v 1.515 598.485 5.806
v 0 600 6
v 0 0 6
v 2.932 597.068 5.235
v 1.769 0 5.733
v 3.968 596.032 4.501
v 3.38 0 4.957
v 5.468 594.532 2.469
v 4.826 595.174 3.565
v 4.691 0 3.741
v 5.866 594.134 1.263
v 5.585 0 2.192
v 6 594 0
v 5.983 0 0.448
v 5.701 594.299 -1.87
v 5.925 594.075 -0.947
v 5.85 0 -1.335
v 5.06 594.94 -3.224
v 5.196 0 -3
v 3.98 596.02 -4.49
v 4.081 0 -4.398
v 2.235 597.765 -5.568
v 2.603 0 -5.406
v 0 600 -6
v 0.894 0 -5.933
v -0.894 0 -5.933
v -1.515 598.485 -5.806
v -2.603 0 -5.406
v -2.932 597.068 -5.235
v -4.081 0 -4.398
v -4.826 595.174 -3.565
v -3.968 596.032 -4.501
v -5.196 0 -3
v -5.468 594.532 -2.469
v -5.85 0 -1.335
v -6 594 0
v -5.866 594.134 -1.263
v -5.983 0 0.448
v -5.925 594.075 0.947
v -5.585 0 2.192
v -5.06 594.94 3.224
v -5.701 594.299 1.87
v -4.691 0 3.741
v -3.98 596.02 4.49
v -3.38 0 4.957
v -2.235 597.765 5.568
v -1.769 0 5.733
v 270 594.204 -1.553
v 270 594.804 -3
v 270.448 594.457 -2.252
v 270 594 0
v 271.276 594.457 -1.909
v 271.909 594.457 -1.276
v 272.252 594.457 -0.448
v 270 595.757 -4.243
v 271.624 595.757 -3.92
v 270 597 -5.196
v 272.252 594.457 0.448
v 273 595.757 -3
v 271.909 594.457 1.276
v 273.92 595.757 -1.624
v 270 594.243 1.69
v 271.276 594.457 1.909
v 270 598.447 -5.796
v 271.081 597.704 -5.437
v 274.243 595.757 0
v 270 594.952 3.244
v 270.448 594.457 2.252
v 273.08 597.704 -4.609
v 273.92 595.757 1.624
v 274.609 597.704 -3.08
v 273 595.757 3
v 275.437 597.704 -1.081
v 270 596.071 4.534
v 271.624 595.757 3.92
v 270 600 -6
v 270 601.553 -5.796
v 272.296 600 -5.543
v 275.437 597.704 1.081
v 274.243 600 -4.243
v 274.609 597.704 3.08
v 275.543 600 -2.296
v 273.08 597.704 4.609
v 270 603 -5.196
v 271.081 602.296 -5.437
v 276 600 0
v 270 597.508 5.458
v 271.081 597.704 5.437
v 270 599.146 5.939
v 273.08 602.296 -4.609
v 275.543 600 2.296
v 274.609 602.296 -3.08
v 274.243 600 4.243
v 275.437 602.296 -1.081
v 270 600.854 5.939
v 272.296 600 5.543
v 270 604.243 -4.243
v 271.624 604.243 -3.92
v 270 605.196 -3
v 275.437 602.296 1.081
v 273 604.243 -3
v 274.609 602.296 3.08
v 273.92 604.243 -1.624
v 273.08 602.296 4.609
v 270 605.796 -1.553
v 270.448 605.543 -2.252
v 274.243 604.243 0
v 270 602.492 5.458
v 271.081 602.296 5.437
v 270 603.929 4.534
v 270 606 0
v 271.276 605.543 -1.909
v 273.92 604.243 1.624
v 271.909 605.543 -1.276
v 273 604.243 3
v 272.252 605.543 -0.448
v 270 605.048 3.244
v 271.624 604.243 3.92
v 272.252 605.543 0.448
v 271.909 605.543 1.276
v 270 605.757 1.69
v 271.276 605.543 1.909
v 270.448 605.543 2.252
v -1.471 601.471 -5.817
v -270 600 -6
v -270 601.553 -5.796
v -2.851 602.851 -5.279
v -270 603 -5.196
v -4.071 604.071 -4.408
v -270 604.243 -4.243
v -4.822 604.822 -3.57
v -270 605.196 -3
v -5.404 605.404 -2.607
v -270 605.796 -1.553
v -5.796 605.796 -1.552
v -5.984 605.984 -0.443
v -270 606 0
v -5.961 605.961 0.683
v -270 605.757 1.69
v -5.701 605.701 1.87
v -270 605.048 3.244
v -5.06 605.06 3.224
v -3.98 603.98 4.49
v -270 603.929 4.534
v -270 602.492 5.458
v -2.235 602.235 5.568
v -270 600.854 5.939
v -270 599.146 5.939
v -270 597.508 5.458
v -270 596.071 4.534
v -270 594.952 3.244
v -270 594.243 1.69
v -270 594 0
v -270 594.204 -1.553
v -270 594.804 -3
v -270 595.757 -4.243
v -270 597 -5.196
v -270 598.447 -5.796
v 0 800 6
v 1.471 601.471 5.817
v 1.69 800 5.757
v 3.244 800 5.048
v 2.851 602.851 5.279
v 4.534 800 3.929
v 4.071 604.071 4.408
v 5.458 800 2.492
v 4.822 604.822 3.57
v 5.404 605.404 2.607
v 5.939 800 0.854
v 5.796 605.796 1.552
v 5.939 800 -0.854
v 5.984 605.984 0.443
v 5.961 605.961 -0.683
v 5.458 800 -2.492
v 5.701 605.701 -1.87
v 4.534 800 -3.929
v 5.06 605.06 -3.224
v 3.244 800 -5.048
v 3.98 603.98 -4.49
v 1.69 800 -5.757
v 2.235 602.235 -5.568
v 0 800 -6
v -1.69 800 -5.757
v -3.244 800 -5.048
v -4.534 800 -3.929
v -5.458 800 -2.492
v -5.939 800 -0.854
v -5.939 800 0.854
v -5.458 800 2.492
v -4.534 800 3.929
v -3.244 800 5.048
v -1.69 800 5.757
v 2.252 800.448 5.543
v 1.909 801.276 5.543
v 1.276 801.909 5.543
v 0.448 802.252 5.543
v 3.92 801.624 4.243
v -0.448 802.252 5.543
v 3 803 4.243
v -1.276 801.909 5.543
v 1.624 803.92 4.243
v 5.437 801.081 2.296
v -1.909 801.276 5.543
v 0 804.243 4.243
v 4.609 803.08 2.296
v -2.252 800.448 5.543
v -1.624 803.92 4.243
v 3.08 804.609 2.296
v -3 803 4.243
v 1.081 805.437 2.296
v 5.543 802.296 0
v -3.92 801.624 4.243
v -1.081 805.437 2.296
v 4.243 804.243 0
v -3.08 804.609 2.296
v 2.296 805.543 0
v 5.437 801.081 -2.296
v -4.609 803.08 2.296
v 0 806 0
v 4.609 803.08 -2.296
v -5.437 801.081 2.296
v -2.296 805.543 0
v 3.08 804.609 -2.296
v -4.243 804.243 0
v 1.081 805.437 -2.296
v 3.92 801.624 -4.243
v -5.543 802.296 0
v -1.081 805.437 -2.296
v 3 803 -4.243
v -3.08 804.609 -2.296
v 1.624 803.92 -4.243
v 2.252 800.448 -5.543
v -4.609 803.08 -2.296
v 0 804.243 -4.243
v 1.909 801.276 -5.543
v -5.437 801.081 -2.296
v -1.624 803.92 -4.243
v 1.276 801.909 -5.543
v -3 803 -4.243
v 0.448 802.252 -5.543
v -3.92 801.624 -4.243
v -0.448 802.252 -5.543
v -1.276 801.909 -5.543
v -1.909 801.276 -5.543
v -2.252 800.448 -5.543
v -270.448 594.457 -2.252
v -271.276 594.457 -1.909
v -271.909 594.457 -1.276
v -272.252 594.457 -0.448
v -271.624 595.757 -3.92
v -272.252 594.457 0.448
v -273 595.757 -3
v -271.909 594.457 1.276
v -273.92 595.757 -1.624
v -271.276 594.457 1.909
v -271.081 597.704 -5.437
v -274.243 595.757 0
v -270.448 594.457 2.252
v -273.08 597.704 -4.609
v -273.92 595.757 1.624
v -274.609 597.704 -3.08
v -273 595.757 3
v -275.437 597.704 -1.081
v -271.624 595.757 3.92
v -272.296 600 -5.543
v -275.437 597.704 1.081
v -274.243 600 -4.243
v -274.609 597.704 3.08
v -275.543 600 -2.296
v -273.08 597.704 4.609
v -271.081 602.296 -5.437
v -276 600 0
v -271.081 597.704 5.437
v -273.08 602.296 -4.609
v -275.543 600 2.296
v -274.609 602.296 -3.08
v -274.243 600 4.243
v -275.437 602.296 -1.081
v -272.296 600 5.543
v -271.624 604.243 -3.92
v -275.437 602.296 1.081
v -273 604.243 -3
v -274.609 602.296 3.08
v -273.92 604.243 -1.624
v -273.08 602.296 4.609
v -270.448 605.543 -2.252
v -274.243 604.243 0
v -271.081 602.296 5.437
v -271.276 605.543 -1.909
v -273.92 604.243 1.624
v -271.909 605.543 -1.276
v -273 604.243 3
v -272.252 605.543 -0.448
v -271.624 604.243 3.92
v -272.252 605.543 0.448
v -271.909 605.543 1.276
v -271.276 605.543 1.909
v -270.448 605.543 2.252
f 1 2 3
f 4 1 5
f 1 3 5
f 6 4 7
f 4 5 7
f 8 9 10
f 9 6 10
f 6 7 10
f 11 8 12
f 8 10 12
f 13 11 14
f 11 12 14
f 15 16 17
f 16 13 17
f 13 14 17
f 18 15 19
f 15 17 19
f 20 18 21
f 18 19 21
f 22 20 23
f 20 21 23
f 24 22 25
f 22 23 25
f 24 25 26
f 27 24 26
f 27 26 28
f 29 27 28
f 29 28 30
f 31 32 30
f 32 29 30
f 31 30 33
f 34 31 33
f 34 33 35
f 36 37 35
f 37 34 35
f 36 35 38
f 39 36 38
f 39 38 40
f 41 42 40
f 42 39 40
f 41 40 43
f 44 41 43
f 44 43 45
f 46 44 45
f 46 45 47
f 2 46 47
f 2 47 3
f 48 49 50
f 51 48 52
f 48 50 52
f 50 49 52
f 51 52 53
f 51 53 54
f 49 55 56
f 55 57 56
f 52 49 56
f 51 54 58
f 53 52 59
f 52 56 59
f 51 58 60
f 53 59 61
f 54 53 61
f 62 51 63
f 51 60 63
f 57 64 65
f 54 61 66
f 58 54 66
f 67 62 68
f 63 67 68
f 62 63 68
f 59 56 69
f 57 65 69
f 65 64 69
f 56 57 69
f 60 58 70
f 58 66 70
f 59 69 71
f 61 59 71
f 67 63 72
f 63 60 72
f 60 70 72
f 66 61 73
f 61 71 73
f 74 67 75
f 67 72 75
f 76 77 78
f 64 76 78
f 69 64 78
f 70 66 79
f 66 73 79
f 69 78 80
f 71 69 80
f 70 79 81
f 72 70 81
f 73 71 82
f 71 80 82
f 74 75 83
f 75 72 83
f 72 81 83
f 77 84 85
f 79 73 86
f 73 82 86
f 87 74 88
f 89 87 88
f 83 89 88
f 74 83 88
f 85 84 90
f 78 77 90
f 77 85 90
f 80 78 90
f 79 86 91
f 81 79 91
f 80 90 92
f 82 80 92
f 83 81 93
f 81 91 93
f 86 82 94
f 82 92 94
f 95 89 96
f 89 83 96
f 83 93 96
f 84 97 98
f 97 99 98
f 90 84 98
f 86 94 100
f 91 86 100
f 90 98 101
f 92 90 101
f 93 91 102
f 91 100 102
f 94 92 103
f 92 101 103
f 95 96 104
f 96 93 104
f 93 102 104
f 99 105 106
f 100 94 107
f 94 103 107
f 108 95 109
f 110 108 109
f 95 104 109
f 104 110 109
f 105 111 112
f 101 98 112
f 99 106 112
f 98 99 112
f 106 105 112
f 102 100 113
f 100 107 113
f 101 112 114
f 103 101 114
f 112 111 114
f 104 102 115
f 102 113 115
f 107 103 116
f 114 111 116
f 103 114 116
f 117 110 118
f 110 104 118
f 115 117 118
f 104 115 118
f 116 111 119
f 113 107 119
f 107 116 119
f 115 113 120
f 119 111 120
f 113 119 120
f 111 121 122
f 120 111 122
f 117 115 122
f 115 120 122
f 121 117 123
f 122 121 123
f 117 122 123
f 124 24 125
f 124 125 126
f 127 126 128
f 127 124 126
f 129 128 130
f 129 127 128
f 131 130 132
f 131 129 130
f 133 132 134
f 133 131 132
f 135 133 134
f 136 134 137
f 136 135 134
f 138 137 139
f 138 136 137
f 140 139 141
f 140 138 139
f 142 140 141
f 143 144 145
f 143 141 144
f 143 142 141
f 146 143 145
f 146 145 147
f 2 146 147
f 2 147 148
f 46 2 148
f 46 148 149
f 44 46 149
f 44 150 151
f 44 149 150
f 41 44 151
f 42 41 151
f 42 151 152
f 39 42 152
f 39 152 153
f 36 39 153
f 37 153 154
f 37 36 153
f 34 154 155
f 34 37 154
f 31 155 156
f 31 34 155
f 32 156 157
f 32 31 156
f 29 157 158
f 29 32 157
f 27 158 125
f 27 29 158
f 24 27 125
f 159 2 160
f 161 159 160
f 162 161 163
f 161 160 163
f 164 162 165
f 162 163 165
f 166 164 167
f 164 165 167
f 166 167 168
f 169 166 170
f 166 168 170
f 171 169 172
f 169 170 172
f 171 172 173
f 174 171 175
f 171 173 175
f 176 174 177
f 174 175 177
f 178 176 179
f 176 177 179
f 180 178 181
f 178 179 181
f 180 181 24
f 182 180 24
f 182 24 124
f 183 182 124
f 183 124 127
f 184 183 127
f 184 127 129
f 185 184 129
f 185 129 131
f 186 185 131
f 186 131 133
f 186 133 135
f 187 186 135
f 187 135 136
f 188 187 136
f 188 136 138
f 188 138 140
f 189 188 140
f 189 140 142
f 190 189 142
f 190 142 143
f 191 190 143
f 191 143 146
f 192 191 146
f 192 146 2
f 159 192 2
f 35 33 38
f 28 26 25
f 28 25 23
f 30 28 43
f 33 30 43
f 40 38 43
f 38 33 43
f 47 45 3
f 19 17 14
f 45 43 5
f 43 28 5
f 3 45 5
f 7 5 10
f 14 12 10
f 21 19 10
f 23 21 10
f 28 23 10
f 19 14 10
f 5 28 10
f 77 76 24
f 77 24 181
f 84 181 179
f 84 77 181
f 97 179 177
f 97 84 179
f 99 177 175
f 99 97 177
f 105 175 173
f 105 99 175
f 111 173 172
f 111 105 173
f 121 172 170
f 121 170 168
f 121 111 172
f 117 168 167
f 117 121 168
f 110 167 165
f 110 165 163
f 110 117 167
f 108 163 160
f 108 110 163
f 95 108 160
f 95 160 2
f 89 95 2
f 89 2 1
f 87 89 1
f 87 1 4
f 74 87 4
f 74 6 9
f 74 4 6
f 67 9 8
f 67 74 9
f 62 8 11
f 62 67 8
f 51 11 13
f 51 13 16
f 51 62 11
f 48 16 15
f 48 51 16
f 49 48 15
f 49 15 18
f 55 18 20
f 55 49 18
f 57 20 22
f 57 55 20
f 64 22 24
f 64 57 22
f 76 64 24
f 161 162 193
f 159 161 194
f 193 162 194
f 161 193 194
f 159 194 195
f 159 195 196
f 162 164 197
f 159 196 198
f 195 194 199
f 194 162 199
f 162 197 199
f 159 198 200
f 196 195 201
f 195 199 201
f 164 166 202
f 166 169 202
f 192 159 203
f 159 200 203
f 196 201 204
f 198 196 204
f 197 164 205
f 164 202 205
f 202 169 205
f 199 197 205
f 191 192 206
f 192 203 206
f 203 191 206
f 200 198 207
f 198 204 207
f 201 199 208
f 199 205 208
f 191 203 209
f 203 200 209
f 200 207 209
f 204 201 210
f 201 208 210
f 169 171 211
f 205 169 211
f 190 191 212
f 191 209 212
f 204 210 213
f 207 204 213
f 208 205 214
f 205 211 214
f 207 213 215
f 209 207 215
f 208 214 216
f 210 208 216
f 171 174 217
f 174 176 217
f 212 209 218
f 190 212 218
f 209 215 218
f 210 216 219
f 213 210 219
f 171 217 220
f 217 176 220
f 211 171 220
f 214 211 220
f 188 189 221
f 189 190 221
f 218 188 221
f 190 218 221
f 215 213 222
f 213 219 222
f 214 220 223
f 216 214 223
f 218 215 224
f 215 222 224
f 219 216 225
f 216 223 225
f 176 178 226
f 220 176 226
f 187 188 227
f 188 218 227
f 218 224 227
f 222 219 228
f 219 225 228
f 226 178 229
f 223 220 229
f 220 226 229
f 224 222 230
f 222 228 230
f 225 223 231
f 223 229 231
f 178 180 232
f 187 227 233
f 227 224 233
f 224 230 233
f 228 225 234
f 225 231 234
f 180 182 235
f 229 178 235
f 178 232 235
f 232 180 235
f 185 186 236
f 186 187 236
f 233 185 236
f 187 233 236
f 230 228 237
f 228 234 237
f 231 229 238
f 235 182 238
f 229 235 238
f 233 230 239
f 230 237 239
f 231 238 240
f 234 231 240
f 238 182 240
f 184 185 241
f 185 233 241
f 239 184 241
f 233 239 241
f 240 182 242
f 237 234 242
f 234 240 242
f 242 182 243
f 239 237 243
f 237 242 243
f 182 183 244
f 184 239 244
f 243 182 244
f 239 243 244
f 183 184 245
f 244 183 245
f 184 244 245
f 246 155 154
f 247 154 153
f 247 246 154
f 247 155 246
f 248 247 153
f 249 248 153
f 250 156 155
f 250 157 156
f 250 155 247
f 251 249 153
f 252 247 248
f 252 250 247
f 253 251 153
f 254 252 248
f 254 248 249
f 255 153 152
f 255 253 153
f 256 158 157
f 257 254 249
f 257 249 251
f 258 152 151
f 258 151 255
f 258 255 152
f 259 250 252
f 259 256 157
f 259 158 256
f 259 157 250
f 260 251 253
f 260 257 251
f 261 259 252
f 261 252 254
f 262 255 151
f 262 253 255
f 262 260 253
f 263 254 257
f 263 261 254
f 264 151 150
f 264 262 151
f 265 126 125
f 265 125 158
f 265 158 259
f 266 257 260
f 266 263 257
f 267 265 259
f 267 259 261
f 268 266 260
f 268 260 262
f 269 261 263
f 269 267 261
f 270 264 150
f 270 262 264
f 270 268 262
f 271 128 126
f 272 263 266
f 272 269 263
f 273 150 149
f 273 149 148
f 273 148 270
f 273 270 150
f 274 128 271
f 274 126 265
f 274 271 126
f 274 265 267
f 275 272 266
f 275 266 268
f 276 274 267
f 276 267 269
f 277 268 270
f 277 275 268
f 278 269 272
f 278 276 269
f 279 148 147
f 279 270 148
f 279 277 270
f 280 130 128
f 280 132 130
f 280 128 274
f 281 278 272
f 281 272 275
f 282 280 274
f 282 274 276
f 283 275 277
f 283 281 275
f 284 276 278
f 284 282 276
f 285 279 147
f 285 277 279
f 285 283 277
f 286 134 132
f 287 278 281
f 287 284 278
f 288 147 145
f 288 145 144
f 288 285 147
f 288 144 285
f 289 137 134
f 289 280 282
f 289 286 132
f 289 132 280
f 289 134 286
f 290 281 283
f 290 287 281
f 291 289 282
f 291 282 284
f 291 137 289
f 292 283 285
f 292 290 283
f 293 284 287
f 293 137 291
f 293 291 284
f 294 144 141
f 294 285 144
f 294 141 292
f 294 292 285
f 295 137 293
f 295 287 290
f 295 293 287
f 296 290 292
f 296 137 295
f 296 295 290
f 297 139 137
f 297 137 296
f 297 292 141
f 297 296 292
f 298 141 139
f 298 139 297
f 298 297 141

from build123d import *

# Parameters (mm, degrees)
SKETCH_1_R      = 6
EXTRUDE_1_DEPTH = 800
SKETCH_2_R      = 6
EXTRUDE_2_DEPTH = 270
REVOLVE_1_ANGLE = 180
REVOLVE_2_ANGLE = 180


with BuildPart() as part:
    # 草图1 → 凸台-拉伸1 (new body)
    with BuildSketch(Plane(origin=(0, 0, 0), x_dir=(1, 0, 0), z_dir=(0, 1, 0))):
        Circle(SKETCH_1_R)
    extrude(amount=EXTRUDE_1_DEPTH)

    # 草图2 → 凸台-拉伸2 (add, symmetric)
    with BuildSketch(Plane(origin=(0, 0, 0), x_dir=(0, 0, -1), z_dir=(1, 0, 0))):
        with Locations((0, 600)):
            Circle(SKETCH_2_R)
    extrude(amount=EXTRUDE_2_DEPTH, both=True)

    # 草图3 → 旋转1 (revolve)
    with BuildSketch(Plane(origin=(270, 0, 0), x_dir=(0, 0, -1), z_dir=(1, 0, 0))):
        with BuildLine():
            Line((0, 606), (0, 594))
            ThreePointArc((0, 594), (6, 600), (0, 606))
        make_face()
    revolve_1 = revolve(axis=Axis((270, 606, 0), (0, -1, 0)), revolution_arc=REVOLVE_1_ANGLE)

    # 草图4 → 旋转2 (revolve)
    with BuildSketch(Plane(origin=(0, 800, 0), x_dir=(1, 0, 0), z_dir=(0, 1, 0))):
        with BuildLine():
            Line((0, 6), (0, -6))
            ThreePointArc((0, -6), (6, 0), (0, 6))
        make_face()
    revolve(axis=Axis((0, 800, -6), (0, 0, 1)), revolution_arc=REVOLVE_2_ANGLE)

    # 镜向1: 旋转1 across plane
    add(revolve_1.mirror(Plane(origin=(0, 0, 0), x_dir=(0, 0, 1), z_dir=(1, 0, 0))))


solid = part.part
